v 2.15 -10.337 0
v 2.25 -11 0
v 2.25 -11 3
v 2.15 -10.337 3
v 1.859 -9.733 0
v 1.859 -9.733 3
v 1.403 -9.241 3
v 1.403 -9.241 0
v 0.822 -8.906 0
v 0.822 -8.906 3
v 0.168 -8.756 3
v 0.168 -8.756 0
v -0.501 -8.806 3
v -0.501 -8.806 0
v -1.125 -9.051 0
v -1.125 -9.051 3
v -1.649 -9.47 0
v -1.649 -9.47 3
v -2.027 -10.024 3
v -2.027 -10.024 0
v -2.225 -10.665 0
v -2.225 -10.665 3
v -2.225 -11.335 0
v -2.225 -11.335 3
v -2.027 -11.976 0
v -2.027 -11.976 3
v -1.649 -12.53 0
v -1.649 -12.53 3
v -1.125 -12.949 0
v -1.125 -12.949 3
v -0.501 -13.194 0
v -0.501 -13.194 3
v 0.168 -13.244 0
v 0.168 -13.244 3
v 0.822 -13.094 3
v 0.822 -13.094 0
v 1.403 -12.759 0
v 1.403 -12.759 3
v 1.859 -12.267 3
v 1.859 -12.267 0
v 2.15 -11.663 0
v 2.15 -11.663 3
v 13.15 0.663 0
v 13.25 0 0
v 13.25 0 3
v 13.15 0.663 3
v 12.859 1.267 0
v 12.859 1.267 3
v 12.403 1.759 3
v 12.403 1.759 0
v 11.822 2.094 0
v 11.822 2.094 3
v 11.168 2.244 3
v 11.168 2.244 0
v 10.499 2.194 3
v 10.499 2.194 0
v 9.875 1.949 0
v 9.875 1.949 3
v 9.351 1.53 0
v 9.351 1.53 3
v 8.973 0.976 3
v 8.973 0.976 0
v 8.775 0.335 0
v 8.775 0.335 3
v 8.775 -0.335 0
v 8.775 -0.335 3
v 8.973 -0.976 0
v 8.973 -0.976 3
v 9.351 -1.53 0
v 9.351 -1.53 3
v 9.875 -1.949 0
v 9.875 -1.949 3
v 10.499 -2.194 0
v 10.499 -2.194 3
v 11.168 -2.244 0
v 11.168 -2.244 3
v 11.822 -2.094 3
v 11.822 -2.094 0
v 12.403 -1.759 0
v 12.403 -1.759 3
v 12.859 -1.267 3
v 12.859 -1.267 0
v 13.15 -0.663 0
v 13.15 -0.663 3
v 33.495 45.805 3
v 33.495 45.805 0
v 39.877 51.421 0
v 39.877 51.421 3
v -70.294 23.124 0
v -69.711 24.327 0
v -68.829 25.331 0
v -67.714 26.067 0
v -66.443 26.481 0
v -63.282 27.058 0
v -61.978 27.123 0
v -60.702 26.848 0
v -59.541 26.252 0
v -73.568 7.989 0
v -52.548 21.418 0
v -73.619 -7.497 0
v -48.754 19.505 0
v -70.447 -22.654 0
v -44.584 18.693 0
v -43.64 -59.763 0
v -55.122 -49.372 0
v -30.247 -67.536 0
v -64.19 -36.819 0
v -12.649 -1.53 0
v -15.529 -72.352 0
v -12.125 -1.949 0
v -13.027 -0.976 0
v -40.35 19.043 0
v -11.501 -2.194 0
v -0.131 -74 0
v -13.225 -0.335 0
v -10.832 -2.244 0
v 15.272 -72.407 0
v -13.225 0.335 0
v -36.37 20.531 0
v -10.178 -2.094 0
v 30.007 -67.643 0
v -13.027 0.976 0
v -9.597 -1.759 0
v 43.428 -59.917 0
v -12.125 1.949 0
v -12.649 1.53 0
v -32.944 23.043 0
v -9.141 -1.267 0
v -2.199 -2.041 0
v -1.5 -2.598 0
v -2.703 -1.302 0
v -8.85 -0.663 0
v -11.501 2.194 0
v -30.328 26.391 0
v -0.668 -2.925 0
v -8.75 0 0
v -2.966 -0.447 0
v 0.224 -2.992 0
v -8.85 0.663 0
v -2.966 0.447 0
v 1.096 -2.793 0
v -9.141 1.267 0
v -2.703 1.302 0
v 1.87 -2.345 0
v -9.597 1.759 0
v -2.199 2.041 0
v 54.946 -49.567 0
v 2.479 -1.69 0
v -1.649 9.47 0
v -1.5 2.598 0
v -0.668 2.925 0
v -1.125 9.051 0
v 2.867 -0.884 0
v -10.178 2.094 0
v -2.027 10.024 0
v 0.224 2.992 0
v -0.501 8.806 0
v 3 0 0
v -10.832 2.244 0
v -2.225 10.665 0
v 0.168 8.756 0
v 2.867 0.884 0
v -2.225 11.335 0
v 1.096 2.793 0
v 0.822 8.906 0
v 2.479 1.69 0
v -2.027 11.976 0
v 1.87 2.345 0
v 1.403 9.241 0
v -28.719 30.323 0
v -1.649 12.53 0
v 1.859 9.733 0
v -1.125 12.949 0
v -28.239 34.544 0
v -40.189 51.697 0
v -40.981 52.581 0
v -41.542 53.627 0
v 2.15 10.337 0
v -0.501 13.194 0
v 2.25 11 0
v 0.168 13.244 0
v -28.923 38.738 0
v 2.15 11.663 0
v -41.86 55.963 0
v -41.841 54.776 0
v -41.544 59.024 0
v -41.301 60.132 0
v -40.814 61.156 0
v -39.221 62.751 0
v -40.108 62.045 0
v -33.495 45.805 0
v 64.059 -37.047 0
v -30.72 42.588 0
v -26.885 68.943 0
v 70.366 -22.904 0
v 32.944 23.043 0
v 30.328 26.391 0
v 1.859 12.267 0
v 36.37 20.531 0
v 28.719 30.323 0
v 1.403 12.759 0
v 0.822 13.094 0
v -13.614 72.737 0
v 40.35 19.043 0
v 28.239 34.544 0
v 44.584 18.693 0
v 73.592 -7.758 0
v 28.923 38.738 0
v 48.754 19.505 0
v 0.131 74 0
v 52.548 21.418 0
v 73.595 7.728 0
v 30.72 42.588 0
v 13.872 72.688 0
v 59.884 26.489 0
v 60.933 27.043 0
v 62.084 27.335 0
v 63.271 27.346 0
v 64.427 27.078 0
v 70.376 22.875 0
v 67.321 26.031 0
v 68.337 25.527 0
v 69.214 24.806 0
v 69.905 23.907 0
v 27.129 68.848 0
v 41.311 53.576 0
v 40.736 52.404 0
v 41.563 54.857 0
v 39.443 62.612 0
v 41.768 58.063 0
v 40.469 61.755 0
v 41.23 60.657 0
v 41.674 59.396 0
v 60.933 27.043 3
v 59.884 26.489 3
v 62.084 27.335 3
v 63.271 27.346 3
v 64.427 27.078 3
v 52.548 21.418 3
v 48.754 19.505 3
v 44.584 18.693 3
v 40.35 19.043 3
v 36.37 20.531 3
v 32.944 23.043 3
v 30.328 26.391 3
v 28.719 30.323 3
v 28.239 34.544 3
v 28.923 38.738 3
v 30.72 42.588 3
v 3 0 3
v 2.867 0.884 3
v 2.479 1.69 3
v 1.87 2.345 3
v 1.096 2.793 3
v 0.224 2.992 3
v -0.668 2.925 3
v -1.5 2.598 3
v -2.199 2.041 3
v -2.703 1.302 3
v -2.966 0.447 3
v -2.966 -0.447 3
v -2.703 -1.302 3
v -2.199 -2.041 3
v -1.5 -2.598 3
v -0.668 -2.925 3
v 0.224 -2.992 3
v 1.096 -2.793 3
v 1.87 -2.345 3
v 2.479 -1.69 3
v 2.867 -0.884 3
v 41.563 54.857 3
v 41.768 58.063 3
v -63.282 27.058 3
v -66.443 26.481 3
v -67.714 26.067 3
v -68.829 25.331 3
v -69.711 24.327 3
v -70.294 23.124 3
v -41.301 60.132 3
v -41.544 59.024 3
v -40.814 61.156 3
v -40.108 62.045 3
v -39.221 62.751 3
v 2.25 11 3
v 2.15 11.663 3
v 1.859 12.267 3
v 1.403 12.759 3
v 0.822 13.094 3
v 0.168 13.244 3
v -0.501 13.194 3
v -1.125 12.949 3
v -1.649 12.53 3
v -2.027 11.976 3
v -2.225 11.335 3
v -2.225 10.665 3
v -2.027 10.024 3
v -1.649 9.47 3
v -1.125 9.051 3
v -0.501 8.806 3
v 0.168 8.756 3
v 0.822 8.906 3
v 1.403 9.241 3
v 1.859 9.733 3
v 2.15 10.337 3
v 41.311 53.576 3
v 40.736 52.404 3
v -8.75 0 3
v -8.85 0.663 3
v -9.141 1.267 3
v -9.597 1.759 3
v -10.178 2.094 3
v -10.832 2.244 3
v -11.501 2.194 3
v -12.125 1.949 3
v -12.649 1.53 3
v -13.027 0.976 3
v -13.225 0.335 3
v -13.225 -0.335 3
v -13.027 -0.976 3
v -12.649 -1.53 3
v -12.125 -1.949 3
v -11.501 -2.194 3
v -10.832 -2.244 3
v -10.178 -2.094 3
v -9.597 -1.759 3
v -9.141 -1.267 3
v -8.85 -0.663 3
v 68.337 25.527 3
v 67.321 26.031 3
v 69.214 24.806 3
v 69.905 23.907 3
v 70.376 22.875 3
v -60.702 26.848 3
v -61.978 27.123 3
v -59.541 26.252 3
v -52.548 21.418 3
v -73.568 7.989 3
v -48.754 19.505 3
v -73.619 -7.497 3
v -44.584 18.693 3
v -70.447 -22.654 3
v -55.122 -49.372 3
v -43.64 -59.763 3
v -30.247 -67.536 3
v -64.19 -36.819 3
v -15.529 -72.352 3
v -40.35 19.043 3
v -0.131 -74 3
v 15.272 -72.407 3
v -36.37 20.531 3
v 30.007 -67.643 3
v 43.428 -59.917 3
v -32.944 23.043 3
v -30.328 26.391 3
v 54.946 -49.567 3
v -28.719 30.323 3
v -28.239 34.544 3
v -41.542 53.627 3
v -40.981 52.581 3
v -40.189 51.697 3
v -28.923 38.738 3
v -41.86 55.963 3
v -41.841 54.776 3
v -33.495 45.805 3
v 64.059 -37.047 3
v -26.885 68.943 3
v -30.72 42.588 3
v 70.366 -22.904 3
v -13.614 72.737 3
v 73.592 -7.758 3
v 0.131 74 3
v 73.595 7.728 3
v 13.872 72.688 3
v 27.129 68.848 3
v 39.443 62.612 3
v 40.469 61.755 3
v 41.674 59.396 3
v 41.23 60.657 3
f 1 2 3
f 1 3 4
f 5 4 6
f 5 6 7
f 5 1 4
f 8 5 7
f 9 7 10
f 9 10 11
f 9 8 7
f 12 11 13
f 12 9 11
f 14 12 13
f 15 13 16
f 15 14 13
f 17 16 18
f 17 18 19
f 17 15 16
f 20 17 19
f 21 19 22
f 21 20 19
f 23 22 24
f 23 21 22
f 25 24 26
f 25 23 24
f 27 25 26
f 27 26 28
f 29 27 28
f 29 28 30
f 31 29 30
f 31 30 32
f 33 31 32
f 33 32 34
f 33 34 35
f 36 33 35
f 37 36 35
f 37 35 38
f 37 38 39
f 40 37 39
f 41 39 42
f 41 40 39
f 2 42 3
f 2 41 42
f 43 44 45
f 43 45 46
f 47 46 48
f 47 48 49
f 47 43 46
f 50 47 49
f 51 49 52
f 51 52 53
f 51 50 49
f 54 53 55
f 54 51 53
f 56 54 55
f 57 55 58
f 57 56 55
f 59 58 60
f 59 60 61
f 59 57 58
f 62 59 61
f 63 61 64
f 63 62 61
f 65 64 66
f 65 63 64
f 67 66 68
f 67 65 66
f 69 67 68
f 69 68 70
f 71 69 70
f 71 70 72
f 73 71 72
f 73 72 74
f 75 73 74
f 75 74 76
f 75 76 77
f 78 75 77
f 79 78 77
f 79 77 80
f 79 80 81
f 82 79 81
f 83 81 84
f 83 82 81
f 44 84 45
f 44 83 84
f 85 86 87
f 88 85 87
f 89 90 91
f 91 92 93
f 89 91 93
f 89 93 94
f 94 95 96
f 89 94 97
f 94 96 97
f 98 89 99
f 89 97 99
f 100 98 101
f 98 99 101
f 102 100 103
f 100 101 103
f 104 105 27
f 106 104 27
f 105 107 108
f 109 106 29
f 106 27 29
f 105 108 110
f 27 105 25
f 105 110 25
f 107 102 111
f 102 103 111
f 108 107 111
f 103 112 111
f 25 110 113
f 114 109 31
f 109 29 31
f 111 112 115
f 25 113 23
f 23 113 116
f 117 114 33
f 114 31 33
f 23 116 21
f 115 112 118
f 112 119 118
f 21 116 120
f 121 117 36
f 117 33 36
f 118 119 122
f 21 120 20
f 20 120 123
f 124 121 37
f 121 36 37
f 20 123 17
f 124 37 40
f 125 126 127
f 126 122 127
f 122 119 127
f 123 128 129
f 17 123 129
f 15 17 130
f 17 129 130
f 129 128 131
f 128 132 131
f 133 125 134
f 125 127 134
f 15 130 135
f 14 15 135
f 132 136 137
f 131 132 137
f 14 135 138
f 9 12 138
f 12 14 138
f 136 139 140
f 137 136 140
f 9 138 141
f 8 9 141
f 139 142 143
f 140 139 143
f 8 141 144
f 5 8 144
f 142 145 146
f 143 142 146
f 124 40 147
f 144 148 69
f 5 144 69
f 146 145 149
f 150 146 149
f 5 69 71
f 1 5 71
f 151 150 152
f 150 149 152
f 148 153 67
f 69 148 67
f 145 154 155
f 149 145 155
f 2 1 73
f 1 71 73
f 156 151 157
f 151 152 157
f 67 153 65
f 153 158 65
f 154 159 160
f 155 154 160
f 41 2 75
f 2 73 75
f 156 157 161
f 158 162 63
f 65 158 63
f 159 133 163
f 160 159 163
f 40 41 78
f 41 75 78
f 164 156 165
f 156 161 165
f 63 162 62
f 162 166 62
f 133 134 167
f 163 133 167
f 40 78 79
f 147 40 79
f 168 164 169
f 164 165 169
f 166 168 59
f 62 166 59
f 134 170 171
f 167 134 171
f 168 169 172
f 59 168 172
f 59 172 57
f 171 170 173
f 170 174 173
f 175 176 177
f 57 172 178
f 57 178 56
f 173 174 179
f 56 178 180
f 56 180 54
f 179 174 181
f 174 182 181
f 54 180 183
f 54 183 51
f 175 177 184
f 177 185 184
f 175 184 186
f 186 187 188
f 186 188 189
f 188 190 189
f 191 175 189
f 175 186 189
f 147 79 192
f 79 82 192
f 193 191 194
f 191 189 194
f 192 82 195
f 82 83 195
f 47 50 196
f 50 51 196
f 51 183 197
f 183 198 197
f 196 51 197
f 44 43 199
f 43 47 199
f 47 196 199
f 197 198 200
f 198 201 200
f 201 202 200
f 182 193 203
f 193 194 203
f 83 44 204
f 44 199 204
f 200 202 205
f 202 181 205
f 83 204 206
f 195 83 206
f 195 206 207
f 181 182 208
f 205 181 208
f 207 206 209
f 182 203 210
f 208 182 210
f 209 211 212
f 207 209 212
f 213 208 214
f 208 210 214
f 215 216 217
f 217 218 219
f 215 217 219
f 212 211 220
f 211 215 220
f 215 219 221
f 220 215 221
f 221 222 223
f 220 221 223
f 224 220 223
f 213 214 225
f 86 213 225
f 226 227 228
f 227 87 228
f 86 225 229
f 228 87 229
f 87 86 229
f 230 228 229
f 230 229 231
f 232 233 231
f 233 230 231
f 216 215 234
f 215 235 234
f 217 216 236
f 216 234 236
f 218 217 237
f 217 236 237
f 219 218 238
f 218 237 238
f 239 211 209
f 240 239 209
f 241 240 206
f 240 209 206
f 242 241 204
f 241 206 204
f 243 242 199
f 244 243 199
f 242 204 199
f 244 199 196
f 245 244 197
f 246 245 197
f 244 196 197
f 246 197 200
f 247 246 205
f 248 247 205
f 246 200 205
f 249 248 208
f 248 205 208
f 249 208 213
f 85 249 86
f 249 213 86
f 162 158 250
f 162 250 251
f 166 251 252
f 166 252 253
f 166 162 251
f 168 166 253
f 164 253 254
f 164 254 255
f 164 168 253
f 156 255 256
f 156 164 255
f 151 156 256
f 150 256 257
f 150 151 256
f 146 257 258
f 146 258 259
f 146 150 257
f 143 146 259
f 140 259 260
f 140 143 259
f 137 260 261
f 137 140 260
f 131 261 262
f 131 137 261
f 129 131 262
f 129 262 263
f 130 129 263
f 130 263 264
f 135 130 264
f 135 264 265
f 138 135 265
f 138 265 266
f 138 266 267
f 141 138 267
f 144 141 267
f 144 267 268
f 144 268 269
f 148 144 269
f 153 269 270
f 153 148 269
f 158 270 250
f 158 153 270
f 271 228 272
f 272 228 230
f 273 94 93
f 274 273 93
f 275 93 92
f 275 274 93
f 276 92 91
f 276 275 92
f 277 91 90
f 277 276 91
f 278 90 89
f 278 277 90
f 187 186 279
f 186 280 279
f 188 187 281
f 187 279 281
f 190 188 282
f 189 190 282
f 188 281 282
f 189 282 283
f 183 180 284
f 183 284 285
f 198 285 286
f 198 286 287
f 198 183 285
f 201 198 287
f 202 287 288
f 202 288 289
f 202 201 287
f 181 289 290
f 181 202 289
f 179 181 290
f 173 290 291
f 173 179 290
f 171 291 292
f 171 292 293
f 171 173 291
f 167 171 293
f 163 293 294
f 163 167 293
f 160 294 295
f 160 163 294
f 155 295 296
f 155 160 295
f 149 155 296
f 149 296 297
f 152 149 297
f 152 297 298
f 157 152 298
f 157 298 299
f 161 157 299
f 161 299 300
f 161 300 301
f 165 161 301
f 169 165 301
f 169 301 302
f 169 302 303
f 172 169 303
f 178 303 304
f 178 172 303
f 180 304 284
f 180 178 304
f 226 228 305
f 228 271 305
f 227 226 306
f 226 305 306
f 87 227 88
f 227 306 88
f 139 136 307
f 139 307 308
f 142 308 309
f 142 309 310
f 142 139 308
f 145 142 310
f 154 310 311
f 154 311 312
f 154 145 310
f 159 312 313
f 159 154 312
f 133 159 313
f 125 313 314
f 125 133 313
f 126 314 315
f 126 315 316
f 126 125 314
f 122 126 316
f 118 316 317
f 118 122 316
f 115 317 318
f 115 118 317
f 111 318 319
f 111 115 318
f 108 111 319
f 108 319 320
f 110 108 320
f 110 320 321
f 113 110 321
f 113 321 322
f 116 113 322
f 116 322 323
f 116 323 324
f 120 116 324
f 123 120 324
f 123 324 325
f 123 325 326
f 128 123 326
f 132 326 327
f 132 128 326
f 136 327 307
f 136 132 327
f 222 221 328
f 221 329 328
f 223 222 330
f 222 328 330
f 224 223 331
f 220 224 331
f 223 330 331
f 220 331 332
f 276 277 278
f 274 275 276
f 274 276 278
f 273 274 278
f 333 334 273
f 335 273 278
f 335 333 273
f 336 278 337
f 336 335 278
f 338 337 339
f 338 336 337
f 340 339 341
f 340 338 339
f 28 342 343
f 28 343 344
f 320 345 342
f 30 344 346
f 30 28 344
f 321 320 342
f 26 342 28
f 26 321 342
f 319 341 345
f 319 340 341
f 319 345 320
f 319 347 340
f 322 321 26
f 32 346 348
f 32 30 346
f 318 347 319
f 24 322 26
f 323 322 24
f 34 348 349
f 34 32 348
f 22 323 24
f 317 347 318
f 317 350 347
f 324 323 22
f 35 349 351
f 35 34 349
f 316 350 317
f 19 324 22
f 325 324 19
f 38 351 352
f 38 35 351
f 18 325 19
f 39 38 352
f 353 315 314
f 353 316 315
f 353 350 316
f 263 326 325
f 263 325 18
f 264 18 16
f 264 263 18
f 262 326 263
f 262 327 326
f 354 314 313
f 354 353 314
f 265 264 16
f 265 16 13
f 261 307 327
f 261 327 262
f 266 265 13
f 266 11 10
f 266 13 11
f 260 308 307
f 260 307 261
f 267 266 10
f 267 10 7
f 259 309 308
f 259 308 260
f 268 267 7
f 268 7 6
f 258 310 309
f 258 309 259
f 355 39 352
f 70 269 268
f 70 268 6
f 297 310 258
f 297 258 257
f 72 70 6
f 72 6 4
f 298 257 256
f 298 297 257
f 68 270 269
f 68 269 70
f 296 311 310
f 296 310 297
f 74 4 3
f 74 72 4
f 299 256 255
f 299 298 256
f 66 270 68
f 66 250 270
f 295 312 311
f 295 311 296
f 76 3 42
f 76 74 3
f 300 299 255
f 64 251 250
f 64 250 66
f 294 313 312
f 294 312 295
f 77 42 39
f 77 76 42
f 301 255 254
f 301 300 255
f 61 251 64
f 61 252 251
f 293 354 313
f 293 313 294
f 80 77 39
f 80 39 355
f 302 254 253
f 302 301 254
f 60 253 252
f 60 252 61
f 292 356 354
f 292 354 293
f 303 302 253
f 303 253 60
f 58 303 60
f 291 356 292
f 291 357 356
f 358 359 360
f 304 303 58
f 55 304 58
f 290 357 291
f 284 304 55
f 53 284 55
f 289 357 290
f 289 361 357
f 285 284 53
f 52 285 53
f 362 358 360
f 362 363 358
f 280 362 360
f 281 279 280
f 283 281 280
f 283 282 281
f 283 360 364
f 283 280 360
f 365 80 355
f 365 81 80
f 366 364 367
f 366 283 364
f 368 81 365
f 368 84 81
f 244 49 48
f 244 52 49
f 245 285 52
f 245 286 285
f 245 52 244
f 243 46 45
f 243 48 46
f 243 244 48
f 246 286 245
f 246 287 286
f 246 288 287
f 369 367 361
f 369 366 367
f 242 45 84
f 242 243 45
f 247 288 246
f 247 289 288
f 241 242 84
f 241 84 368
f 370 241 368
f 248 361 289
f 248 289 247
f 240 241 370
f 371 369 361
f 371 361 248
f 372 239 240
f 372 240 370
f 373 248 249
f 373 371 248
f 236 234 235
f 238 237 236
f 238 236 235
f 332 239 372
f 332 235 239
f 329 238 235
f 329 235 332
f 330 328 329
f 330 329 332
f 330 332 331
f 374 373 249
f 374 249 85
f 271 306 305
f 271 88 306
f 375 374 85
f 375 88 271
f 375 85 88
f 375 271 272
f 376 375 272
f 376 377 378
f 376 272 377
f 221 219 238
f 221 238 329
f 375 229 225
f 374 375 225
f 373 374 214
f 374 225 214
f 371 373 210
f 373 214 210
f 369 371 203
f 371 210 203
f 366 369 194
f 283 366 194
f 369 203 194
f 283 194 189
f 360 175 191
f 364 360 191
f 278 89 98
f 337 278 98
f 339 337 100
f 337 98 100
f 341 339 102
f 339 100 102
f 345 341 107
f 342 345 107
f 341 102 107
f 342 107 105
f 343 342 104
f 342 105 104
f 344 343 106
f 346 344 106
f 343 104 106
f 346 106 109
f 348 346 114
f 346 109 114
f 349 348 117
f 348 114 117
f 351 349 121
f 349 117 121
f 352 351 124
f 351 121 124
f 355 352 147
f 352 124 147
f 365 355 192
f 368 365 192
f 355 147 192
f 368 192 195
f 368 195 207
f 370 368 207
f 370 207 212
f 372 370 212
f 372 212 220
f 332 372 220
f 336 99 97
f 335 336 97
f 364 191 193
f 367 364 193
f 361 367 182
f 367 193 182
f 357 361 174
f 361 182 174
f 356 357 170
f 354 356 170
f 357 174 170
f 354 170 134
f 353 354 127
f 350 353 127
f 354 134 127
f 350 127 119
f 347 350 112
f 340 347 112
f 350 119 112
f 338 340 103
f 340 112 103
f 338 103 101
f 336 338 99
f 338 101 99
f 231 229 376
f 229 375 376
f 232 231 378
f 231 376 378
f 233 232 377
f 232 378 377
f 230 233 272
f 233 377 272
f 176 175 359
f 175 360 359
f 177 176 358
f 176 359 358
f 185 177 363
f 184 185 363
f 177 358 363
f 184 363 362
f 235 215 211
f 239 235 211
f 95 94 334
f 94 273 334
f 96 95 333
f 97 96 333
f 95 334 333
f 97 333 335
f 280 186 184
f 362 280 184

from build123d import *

# Parameters (mm, degrees)
ESQUISSE1_R        = 2.25
ESQUISSE1_R_2      = 3
BOSS_EXTRU_1_DEPTH = 3
CHANFREIN1_SIZE    = 7
CHANFREIN1_SIZE_2  = 6.077264162
CONG_2_R           = 5


with BuildPart() as part:
    # Esquisse1 → Boss.-Extru.1 (new body)
    with BuildSketch(Plane.XY):
        with BuildLine():
            Line((67.003163723, 31.409808199), (52.547583613, 21.418476063))
            ThreePointArc((52.547583613, 21.418476063), (31.520430144, 24.626459013), (33.494666824, 45.805097476))
            Line((33.494666824, 45.805097476), (46.686335037, 57.414163068))
            ThreePointArc((46.686335037, 57.414163068), (0, 74), (-46.686335037, 57.414163068))
            Line((-46.686335037, 57.414163068), (-33.494666824, 45.805097476))
            ThreePointArc((-33.494666824, 45.805097476), (-31.520430144, 24.626459013), (-52.547583613, 21.418476063))
            Line((-52.547583613, 21.418476063), (-67.003163723, 31.409808199))
            ThreePointArc((-67.003163723, 31.409808199), (0, -74), (67.003163723, 31.409808199))
        make_face()
        with Locations((0, 11)):
            Circle(ESQUISSE1_R, mode=Mode.SUBTRACT)
        with Locations((11, 0)):
            Circle(ESQUISSE1_R, mode=Mode.SUBTRACT)
        with Locations((0, -11)):
            Circle(ESQUISSE1_R, mode=Mode.SUBTRACT)
        with Locations((-11, 0)):
            Circle(ESQUISSE1_R, mode=Mode.SUBTRACT)
        Circle(ESQUISSE1_R_2, mode=Mode.SUBTRACT)
    extrude(amount=BOSS_EXTRU_1_DEPTH)

    # Chanfrein1
    # the kernel refuses this chamfer: 7, 6.077264162 mm, written as the material it takes off along each edge
    with BuildSketch(Plane(origin=(-67.003163723, 31.409808199, -18.001780916), x_dir=(0.8226281172410916, -0.5685797927506542, 0), z_dir=(0, 0, 1)), Plane(origin=(46.686335037, 57.414163068, -18.001780916), x_dir=(-0.7507022964494048, -0.660640645211593, 0), z_dir=(0, 0, 1))) as chanfrein1_piece_1:
        with BuildLine():
            Line((CHANFREIN1_SIZE, 0), (1.211839928, -5.788160072))
            ThreePointArc((1.211839928, -5.788160072), (0.563802351, -2.981105416), (0, 0))
            Line((0, 0), (CHANFREIN1_SIZE, 0))
        make_face()
    extrude(amount=39.003561832, mode=Mode.SUBTRACT)
    with BuildSketch(Plane(origin=(-46.686335037, 57.414163068, -17.23797929), x_dir=(0.8036456523944729, 0.5951081123522532, 0), z_dir=(0, 0, 1))) as chanfrein1_piece_2:
        with BuildLine():
            Line((6.703271947, 0), (CHANFREIN1_SIZE_2 * 0.210146029479, -CHANFREIN1_SIZE_2 * 0.977670008946))
            Line((CHANFREIN1_SIZE_2 * 0.210146029479, -CHANFREIN1_SIZE_2 * 0.977670008946), (0, 0))
            ThreePointArc((0, 0), (3.446010548, 0.075880568), (6.703271947, 0))
        make_face()
    extrude(amount=37.475958581, mode=Mode.SUBTRACT)
    with BuildSketch(Plane(origin=(67.003163723, 31.409808199, -17.23797929), x_dir=(-0.8226281172410943, -0.5685797927506503, 0), z_dir=(0, 0, 1))) as chanfrein1_piece_3:
        with BuildLine():
            Line((CHANFREIN1_SIZE_2, 0), (1.408665984, 6.553587944))
            ThreePointArc((1.408665984, 6.553587944), (0.649979278, 3.385007163), (0, 0))
            Line((0, 0), (CHANFREIN1_SIZE_2, 0))
        make_face()
    extrude(amount=37.475958581, mode=Mode.SUBTRACT)

    # Congé2
    cong_2_edges = [part.edges().sort_by_distance(p)[0] for p in [
        (62.003835348, 27.954398601, 1.5),
        (-69.297300979, 25.959277281, 1.5),
        (69.570593152, 25.217703474, 1.5),
        (-41.29927968, 61.403334583, 1.5),
        (41.952710216, 60.958757415, 1.5),
        (41.431418962, 52.789678551, 1.5),
        (-42.124118875, 53.39927535, 1.5),
        (-61.244766903, 27.429749649, 1.5),
    ]]
    fillet(cong_2_edges, radius=CONG_2_R)


solid = part.part
